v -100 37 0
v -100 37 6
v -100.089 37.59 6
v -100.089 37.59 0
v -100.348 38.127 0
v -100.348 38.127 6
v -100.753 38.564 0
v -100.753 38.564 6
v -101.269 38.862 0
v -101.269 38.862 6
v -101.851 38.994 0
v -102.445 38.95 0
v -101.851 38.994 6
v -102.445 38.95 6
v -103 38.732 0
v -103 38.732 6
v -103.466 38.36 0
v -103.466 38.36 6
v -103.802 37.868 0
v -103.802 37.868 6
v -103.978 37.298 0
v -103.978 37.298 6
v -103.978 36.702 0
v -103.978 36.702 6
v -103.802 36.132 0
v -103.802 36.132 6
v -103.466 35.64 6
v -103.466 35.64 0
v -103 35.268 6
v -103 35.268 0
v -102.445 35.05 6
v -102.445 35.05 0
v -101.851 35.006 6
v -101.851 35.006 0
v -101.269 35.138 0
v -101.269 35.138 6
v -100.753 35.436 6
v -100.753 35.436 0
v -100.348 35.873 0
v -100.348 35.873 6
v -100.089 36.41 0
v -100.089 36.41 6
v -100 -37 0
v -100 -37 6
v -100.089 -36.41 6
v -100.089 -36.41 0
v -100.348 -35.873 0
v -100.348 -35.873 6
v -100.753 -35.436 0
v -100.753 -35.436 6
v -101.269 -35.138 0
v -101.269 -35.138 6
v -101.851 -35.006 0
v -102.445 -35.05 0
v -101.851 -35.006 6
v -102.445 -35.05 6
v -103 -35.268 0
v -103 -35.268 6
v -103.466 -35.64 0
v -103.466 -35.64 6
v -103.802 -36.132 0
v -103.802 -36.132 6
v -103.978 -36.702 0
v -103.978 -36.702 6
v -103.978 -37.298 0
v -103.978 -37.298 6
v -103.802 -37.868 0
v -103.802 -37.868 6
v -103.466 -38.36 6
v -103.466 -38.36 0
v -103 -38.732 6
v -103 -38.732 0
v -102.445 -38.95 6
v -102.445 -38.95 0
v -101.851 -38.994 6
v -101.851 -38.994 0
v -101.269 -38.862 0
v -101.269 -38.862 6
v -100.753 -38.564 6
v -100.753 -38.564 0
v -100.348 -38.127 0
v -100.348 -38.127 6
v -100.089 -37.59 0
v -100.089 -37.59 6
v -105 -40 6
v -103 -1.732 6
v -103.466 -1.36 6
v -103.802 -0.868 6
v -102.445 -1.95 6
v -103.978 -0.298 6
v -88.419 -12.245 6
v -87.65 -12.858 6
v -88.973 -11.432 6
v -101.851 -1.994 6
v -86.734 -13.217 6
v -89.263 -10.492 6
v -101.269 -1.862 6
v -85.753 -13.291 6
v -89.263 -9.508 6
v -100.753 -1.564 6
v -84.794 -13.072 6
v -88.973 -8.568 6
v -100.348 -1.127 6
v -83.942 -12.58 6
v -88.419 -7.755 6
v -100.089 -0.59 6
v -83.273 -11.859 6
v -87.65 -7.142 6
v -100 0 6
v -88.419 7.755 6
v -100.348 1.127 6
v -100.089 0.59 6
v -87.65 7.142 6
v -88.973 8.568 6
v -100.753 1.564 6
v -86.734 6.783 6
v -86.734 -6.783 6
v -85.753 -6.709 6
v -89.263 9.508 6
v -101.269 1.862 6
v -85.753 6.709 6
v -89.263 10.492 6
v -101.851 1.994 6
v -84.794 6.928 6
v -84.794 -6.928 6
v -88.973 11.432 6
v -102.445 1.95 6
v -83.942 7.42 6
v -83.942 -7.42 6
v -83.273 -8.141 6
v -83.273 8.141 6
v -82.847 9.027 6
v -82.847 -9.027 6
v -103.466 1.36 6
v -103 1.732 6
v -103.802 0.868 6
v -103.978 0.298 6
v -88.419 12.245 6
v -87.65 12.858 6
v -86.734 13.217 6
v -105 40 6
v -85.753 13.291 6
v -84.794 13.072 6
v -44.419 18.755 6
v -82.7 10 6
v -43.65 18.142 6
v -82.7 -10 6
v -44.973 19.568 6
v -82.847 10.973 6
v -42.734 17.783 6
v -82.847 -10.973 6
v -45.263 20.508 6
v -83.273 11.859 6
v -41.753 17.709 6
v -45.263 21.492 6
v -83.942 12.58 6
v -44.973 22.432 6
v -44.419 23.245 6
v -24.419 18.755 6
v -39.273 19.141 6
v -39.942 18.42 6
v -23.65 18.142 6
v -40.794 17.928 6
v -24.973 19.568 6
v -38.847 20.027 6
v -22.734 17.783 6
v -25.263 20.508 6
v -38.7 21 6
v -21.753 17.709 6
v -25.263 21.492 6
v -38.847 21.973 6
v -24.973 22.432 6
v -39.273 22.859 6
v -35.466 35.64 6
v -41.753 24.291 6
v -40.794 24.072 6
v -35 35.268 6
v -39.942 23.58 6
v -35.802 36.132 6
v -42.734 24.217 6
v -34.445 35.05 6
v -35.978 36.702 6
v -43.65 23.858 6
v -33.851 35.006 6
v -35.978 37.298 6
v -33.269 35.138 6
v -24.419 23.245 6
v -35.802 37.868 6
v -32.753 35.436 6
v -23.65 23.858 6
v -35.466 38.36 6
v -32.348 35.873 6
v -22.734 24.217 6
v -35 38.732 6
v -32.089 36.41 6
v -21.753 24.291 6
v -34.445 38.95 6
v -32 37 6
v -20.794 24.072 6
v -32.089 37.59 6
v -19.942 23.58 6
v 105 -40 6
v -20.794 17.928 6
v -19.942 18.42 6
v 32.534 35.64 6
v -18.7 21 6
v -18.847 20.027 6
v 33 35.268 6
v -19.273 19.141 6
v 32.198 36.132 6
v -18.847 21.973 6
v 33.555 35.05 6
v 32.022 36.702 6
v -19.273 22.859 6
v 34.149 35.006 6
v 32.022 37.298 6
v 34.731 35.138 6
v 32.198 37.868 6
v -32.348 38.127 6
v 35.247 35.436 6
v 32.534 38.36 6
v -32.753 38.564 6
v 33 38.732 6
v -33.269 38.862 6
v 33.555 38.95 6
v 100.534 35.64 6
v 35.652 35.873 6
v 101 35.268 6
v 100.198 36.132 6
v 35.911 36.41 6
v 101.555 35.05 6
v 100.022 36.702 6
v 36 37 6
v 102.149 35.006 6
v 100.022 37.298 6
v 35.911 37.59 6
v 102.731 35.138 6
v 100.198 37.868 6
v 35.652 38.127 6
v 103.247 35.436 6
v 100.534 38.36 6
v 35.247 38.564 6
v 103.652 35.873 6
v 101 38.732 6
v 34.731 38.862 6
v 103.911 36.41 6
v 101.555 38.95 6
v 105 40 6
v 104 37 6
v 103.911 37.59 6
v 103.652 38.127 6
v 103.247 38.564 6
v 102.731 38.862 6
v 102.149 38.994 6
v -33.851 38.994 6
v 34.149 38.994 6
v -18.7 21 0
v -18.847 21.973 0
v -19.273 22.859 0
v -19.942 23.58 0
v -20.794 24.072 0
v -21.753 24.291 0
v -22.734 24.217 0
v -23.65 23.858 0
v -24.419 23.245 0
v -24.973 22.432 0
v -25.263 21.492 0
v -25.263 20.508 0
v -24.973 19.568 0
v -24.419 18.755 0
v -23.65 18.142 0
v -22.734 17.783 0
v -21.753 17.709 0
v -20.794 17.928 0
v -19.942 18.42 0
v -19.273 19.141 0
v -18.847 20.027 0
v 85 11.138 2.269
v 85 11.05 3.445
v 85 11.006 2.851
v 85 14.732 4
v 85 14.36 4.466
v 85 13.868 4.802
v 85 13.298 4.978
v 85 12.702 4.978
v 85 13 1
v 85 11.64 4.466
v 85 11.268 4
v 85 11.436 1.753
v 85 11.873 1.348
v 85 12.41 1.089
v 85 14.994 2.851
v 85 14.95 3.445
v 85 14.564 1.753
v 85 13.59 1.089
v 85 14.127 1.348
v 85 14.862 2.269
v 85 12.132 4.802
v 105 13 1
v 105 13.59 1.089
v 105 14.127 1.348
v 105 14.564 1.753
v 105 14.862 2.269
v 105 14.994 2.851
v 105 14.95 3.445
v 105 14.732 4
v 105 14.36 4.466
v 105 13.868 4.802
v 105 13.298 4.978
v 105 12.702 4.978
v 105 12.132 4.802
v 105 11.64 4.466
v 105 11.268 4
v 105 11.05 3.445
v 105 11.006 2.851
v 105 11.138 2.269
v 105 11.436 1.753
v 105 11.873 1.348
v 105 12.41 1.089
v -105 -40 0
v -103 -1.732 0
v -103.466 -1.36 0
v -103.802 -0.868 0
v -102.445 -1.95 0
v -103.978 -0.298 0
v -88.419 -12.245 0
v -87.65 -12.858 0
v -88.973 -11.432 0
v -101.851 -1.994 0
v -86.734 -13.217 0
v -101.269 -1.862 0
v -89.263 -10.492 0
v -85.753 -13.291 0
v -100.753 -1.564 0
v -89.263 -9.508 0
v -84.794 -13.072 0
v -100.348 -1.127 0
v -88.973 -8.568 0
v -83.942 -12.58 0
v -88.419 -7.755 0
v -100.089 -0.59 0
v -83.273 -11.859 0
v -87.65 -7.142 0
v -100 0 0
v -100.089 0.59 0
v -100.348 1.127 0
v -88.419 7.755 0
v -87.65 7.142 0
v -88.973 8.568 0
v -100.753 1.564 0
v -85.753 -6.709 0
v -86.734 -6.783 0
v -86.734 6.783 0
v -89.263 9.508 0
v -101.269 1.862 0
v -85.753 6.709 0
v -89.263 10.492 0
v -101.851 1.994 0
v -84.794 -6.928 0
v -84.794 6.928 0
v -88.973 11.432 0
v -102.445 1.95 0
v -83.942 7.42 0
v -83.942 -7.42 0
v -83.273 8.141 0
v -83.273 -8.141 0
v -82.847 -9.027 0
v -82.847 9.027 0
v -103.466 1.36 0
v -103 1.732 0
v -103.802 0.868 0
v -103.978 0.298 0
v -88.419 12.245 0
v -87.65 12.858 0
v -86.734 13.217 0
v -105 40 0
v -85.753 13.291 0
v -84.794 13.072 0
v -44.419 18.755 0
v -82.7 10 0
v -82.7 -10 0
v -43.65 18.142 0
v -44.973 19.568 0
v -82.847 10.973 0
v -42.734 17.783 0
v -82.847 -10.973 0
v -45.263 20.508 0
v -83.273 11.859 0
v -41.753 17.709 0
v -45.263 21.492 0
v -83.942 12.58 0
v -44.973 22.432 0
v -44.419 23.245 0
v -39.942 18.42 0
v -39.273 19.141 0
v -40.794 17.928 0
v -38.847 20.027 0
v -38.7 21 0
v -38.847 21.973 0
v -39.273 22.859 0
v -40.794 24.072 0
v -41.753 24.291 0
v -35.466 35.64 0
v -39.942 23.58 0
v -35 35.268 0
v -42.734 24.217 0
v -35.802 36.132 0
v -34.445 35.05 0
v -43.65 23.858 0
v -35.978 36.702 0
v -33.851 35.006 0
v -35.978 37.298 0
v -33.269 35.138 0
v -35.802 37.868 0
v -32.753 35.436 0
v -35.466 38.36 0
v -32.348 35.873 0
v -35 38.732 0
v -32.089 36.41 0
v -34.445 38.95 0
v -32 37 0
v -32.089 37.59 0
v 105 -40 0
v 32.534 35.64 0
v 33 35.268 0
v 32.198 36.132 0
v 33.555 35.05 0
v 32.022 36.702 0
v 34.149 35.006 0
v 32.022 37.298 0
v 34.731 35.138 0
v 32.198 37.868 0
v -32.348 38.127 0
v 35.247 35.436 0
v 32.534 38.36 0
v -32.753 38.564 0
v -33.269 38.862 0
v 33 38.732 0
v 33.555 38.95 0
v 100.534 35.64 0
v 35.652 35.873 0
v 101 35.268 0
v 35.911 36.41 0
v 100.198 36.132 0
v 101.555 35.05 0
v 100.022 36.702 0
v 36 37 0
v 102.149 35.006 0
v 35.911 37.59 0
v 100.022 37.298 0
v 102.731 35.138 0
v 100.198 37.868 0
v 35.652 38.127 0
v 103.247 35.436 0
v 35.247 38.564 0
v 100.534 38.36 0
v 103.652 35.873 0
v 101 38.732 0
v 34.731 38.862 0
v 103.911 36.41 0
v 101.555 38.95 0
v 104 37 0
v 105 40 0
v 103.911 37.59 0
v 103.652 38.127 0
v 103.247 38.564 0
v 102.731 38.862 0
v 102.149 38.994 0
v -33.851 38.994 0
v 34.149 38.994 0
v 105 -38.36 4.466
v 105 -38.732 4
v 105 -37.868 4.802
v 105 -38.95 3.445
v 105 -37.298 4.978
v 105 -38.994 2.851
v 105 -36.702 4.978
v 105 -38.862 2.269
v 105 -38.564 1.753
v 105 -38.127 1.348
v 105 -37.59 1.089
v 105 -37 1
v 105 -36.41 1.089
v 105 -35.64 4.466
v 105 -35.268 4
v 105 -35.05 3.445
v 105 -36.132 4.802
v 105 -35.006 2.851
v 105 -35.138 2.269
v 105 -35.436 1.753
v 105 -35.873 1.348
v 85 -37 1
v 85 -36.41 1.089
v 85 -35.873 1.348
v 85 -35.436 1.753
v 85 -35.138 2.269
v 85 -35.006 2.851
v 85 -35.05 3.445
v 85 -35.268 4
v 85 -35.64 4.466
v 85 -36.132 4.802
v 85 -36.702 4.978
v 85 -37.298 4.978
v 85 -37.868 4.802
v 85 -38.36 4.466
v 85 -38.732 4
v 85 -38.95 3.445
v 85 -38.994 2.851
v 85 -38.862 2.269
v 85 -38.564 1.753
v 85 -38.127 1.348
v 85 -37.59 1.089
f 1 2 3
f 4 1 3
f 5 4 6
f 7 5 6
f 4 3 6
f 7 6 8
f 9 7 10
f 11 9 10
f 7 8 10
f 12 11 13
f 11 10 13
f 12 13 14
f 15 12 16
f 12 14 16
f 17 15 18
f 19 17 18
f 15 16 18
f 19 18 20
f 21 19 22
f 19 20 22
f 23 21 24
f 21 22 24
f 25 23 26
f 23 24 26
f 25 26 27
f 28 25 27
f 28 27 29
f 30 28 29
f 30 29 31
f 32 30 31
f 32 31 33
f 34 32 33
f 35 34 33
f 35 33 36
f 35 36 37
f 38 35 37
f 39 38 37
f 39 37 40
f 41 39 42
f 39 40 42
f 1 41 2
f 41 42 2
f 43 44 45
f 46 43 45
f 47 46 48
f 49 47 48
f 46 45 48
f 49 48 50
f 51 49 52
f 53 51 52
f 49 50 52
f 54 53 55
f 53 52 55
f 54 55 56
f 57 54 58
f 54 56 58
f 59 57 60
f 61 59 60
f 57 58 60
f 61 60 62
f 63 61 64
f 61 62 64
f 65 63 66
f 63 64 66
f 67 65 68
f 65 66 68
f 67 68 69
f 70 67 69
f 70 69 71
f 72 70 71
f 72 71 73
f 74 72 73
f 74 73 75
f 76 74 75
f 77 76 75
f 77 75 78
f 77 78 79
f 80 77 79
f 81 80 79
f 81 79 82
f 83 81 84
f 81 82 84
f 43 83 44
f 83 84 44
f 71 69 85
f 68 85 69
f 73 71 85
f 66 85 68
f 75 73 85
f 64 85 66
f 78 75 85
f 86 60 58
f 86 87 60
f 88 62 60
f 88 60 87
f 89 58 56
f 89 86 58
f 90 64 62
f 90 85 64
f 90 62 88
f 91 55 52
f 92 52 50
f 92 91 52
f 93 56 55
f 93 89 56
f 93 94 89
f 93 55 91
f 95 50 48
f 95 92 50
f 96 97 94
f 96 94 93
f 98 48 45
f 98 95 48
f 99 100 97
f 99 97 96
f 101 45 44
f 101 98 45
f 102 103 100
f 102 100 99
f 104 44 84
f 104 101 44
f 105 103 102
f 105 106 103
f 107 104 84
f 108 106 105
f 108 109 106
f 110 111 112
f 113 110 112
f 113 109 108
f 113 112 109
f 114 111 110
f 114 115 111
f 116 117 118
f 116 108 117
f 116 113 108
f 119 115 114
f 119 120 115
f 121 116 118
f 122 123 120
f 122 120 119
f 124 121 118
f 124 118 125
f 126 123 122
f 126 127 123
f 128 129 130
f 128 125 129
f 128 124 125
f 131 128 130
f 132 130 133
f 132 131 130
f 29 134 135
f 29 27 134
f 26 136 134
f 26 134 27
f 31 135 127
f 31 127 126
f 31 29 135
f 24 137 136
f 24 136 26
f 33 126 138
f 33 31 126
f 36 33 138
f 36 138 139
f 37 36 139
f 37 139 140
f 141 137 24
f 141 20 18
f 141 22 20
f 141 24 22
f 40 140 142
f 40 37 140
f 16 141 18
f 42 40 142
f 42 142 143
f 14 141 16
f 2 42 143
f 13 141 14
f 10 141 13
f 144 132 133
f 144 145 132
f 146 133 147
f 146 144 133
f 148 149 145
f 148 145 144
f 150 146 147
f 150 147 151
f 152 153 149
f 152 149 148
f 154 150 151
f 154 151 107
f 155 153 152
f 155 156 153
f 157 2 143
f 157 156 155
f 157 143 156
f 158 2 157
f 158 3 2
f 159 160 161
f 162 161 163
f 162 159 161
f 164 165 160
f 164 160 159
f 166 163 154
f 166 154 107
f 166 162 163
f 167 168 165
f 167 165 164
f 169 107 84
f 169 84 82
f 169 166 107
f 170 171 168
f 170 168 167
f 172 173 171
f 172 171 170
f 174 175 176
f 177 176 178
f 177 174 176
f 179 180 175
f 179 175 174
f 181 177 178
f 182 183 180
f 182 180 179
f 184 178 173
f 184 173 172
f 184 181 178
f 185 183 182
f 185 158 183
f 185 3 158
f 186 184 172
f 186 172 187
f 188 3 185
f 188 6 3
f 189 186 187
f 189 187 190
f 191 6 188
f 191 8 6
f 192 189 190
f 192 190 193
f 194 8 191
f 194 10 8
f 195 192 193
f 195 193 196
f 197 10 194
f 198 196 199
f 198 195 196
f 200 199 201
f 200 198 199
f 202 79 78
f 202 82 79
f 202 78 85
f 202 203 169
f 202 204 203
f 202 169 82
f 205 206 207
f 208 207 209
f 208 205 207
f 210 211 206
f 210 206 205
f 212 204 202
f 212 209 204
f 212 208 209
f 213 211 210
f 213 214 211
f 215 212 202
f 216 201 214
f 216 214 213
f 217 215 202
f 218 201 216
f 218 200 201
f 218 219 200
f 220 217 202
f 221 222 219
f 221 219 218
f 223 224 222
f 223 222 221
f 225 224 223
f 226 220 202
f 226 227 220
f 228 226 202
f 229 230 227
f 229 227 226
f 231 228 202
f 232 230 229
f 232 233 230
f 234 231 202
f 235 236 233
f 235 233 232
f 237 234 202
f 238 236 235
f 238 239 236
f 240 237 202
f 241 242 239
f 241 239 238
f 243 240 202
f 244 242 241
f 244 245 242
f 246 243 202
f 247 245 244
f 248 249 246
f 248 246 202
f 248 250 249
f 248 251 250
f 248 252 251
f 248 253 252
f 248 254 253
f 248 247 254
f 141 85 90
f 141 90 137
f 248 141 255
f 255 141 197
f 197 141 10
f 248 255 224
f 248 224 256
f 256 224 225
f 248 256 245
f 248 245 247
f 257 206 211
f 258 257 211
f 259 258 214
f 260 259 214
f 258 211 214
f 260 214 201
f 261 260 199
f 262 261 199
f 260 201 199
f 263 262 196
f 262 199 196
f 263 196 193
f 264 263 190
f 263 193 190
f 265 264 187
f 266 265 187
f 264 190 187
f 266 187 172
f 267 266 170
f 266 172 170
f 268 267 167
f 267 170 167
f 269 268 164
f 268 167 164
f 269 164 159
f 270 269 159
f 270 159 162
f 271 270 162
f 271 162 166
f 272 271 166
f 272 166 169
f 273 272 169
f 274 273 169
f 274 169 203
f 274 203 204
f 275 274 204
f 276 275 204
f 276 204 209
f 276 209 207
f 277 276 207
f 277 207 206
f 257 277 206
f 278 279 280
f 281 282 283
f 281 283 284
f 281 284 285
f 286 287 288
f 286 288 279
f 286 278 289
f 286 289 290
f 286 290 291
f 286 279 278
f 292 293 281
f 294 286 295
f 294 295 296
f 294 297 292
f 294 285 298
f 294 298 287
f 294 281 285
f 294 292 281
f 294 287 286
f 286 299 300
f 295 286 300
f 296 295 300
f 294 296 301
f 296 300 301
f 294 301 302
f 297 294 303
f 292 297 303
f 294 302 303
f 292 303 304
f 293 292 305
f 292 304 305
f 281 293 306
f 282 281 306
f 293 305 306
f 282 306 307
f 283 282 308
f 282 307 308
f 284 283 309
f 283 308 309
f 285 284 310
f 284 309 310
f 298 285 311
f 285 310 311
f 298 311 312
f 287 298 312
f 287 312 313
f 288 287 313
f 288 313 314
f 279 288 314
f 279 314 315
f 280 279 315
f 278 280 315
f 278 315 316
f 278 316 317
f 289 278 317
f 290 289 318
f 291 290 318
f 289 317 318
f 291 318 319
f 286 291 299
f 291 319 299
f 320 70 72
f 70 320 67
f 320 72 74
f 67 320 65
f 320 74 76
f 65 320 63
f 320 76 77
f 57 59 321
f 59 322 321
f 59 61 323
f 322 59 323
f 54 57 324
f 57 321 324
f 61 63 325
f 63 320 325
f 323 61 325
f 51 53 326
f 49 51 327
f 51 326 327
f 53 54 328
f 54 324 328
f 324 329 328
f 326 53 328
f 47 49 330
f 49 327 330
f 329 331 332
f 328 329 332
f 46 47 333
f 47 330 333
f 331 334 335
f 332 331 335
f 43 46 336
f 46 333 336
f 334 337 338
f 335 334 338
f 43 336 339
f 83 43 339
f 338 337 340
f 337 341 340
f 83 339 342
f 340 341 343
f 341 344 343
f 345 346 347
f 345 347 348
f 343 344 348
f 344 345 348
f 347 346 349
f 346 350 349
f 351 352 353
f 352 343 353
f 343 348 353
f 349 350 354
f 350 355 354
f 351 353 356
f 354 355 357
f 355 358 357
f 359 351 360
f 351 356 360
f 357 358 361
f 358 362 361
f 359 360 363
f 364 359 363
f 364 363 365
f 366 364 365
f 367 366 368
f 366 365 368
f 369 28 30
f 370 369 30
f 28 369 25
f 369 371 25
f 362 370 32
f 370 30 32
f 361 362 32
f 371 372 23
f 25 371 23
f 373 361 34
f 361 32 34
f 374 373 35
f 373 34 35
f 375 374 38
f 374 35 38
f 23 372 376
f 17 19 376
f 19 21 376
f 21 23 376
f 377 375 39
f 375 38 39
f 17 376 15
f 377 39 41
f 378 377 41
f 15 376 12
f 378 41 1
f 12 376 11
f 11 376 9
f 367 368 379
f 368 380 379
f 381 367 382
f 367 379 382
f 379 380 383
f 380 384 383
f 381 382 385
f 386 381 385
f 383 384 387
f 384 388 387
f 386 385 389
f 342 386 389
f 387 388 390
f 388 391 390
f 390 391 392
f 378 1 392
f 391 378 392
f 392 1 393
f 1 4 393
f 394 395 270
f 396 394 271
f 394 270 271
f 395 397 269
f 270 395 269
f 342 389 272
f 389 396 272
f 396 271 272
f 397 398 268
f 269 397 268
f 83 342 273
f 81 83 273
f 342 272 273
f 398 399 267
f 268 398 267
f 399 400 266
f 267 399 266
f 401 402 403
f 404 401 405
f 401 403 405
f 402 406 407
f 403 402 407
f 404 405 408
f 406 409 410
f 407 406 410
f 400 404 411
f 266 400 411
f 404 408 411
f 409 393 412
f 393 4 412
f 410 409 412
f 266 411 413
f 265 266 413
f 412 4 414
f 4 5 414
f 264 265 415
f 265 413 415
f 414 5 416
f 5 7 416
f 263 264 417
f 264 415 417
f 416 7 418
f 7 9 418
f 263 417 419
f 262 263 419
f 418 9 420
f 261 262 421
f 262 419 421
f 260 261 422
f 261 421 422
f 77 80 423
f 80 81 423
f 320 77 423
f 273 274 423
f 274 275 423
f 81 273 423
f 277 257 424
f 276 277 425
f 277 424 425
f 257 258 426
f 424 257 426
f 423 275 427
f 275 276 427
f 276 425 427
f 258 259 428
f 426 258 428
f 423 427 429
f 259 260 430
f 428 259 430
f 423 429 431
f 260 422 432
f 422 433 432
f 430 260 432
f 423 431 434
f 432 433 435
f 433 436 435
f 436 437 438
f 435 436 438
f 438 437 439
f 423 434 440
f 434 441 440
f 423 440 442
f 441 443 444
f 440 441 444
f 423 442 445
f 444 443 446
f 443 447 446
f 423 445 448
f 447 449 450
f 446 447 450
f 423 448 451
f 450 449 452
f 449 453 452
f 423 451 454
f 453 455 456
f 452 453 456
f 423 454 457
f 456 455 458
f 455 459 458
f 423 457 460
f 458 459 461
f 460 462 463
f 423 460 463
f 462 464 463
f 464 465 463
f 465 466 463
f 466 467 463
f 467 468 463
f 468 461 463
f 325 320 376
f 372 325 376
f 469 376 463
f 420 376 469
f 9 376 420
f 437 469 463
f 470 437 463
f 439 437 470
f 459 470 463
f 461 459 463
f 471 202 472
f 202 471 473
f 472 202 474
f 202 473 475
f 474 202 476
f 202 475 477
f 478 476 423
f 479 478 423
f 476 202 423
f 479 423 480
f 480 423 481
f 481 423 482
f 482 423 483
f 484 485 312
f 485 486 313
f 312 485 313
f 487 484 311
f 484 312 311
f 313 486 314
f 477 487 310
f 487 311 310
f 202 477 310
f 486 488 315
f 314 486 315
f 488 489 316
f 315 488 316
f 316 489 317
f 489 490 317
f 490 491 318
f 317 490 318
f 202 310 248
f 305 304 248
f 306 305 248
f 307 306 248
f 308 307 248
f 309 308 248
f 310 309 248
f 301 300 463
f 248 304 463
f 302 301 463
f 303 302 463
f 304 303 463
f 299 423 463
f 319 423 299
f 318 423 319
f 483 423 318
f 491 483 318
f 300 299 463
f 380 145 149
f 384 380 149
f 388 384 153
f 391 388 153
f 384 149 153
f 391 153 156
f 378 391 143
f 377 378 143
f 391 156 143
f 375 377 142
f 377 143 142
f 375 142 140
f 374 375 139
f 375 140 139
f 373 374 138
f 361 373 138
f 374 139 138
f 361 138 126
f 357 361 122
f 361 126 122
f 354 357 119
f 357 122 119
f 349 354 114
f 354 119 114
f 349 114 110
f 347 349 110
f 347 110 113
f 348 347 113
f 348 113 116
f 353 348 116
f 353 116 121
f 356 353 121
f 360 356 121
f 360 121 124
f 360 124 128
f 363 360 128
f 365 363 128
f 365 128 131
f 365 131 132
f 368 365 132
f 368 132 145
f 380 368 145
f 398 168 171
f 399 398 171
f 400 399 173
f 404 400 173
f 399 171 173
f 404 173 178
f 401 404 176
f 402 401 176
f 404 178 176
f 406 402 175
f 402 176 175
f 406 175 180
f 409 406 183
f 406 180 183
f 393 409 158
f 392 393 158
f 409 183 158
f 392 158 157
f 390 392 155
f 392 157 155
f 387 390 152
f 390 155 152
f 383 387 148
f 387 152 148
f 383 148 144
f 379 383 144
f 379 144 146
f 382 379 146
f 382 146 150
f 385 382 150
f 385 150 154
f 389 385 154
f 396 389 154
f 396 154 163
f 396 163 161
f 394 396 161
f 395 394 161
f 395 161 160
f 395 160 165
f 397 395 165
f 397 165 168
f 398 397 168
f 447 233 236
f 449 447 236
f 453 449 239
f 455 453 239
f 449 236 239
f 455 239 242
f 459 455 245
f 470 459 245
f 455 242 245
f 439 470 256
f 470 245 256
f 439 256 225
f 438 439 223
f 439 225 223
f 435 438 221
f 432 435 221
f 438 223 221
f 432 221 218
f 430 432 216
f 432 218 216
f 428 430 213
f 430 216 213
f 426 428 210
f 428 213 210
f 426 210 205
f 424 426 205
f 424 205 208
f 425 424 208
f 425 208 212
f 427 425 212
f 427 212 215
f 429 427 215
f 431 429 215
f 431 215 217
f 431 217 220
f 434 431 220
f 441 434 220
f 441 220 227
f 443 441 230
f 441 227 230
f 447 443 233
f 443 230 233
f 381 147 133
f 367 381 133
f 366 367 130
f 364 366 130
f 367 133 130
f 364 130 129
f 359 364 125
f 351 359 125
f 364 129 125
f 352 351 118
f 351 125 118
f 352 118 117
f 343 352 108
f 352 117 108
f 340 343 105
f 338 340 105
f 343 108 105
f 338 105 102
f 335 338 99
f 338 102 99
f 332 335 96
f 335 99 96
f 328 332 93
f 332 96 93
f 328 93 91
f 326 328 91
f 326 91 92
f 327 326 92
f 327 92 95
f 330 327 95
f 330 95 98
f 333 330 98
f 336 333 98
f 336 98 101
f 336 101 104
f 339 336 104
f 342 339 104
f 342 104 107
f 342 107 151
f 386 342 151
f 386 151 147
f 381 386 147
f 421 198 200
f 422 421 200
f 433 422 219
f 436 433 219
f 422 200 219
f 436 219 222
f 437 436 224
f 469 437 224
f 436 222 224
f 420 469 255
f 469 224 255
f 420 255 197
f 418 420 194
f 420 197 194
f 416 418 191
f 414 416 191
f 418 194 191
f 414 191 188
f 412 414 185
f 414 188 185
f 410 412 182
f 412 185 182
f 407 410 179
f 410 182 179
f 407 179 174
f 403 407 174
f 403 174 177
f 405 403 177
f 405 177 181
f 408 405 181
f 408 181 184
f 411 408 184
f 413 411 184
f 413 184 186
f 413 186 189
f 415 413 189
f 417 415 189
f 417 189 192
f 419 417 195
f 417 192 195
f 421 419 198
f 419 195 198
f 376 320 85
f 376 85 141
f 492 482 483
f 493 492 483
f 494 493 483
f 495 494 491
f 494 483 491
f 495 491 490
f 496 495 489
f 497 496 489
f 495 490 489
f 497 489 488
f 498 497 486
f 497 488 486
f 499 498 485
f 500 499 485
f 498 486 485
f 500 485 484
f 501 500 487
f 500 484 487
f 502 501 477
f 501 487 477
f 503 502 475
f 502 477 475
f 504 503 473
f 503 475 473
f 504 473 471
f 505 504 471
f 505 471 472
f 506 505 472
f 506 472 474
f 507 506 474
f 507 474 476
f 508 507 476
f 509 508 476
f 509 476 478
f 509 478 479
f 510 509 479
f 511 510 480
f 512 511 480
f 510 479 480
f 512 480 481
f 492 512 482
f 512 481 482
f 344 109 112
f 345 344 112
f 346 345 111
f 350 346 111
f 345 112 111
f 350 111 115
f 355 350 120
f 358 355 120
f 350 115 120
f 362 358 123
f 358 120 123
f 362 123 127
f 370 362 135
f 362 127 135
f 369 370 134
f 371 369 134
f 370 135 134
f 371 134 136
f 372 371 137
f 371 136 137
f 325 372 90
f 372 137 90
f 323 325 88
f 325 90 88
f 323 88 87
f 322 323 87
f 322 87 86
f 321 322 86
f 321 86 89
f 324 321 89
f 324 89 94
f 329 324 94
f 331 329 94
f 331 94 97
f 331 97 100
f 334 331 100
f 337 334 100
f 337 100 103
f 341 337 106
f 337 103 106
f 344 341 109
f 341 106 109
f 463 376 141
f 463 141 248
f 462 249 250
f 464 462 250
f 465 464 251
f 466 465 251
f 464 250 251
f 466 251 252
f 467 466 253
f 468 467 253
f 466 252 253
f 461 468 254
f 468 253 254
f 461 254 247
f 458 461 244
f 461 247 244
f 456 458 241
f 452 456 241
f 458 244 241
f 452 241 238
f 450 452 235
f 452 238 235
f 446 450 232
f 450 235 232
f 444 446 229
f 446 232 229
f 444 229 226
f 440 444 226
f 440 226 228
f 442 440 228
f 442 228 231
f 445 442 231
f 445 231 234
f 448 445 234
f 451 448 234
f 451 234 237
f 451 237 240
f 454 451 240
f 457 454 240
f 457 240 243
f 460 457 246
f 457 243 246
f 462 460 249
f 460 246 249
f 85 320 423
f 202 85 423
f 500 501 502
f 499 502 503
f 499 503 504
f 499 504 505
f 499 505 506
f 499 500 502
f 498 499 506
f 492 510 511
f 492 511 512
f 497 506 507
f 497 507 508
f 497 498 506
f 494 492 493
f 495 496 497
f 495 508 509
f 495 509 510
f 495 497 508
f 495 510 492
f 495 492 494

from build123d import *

# Parameters (mm, degrees)
SKETCH_1_W          = 210
SKETCH_1_H          = 80
EXTRUDE_1_DEPTH     = 6
SKETCH_2_R          = 2
CUT_EXTRUDE_1_DEPTH = 6
SKETCH_3_R          = 2
CUT_EXTRUDE_2_DEPTH = 20
SKETCH_4_R          = 3.3
CUT_EXTRUDE_3_DEPTH = 10
SKETCH_5_R          = 3.3
CUT_EXTRUDE_4_DEPTH = 10


with BuildPart() as part:
    # 草图1 → 凸台-拉伸1 (new body)
    with BuildSketch(Plane.XY):
        Rectangle(SKETCH_1_W, SKETCH_1_H)
    extrude(amount=EXTRUDE_1_DEPTH)

    # 草图2 → 切除-拉伸1 (cut)
    with BuildSketch(Plane.XY.offset(6)):
        with Locations((-102, 0)):
            Circle(SKETCH_2_R)
        with Locations((-102, 37)):
            Circle(SKETCH_2_R)
        with Locations((-102, -37)):
            Circle(SKETCH_2_R)
        with Locations((-34, 37)):
            Circle(SKETCH_2_R)
        with Locations((34, 37)):
            Circle(SKETCH_2_R)
        with Locations((102, 37)):
            Circle(SKETCH_2_R)
    extrude(amount=-CUT_EXTRUDE_1_DEPTH, mode=Mode.SUBTRACT)

    # 草图3 → 切除-拉伸2 (cut)
    with BuildSketch(Plane(origin=(105, 0, 0), x_dir=(0, 0, -1), z_dir=(1, 0, 0))):
        with Locations((-3, -37)):
            Circle(SKETCH_3_R)
        with Locations((-3, 13)):
            Circle(SKETCH_3_R)
    extrude(amount=-CUT_EXTRUDE_2_DEPTH, mode=Mode.SUBTRACT)

    # 草图4 → 切除-拉伸3 (cut)
    with BuildSketch(Plane.XY.offset(6)):
        with Locations((-86, 10)):
            Circle(SKETCH_4_R)
        with Locations((-86, -10)):
            Circle(SKETCH_4_R)
    extrude(amount=-CUT_EXTRUDE_3_DEPTH, mode=Mode.SUBTRACT)

    # 草图5 → 切除-拉伸4 (cut)
    with BuildSketch(Plane.XY.offset(6)):
        with Locations((-42, 21)):
            Circle(SKETCH_5_R)
        with Locations((-22, 21)):
            Circle(SKETCH_5_R)
    extrude(amount=-CUT_EXTRUDE_4_DEPTH, mode=Mode.SUBTRACT)


solid = part.part
